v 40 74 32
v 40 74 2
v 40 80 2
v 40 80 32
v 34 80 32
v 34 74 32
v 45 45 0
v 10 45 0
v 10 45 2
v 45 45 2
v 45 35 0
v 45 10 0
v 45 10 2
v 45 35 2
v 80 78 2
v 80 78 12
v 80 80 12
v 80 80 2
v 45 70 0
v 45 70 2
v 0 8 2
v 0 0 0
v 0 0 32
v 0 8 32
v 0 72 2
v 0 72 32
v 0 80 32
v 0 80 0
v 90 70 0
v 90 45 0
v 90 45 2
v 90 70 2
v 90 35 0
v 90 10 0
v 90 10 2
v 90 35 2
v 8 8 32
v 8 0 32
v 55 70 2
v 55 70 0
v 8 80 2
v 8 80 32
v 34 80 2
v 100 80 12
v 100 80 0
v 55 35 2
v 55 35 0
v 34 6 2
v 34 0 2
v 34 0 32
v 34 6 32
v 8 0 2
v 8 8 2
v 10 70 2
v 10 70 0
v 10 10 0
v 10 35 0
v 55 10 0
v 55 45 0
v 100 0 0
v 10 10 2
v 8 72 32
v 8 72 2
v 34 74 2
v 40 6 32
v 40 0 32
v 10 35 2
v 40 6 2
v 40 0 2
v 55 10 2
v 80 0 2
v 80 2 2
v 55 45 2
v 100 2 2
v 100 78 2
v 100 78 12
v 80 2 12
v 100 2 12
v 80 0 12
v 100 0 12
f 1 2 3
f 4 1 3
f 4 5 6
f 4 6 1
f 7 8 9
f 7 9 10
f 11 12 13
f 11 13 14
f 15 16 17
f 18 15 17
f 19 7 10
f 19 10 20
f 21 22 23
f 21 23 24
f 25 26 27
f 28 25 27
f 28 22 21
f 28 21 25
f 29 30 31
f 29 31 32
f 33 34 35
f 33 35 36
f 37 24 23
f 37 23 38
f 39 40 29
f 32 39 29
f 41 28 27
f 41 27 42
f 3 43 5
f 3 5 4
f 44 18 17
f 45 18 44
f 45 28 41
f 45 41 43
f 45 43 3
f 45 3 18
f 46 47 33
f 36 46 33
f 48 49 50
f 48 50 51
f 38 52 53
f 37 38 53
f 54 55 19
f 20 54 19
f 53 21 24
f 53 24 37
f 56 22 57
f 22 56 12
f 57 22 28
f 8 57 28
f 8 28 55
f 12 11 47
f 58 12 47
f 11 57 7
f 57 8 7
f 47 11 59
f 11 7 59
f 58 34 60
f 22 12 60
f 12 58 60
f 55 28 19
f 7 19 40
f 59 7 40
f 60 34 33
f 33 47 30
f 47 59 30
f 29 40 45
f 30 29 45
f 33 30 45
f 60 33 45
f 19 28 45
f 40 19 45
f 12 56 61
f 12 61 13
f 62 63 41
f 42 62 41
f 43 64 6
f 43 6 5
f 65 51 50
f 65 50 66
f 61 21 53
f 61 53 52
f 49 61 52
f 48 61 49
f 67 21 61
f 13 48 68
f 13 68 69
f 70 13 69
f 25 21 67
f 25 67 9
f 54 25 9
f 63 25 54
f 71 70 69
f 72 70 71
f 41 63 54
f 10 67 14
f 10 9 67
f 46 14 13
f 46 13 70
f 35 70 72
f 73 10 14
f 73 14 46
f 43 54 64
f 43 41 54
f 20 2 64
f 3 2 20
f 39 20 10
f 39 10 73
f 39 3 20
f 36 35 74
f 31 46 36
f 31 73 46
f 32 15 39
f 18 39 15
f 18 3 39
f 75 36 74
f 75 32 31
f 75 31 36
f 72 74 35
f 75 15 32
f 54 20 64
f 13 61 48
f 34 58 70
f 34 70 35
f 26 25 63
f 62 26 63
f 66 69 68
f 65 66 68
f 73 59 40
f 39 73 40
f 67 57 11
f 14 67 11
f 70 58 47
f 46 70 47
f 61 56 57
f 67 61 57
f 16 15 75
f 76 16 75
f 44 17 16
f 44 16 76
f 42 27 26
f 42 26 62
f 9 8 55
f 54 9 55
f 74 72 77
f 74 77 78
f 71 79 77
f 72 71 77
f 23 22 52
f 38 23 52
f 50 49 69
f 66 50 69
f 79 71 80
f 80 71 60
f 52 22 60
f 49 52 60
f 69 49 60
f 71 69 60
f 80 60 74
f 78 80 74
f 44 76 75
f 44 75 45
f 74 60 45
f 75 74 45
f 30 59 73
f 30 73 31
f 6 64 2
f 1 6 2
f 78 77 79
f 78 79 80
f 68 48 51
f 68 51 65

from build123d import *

# Parameters (mm, degrees)
BOX009_W     = 10
BOX009_H     = 80
BOX009_DEPTH = 2
BOX008_W     = 20
BOX008_H     = 2
BOX008_DEPTH = 12
BOX007_W     = 20
BOX007_H     = 2
BOX007_DEPTH = 12
BOX006_W     = 80
BOX006_H     = 25
BOX006_DEPTH = 10
BOX005_W     = 80
BOX005_H     = 25
BOX005_DEPTH = 10
BOX004_W     = 6
BOX004_H     = 6
BOX004_DEPTH = 32
BOX003_W     = 6
BOX003_H     = 6
BOX003_DEPTH = 32
BOX002_W     = 8
BOX002_H     = 8
BOX002_DEPTH = 32
BOX001_W     = 8
BOX001_H     = 8
BOX001_DEPTH = 32
BOX_W        = 100
BOX_H        = 80
BOX_DEPTH    = 2


with BuildPart() as cube009:
    # Box009 → Box009 (new body)
    with BuildSketch(Plane(origin=(45, 0, 0), x_dir=(1, 0, 0), z_dir=(0, 0, 1))):
        with Locations((5, 40)):
            Rectangle(BOX009_W, BOX009_H)
    extrude(amount=BOX009_DEPTH)


with BuildPart() as cube008:
    # Box008 → Box008 (new body)
    with BuildSketch(Plane(origin=(80, 78, 0), x_dir=(1, 0, 0), z_dir=(0, 0, 1))):
        with Locations((10, 1)):
            Rectangle(BOX008_W, BOX008_H)
    extrude(amount=BOX008_DEPTH)


with BuildPart() as cube007:
    # Box007 → Box007 (new body)
    with BuildSketch(Plane(origin=(80, 0, 0), x_dir=(1, 0, 0), z_dir=(0, 0, 1))):
        with Locations((10, 1)):
            Rectangle(BOX007_W, BOX007_H)
    extrude(amount=BOX007_DEPTH)


with BuildPart() as cube006:
    # Box006 → Box006 (new body)
    with BuildSketch(Plane(origin=(10, 45, 0), x_dir=(1, 0, 0), z_dir=(0, 0, 1))):
        with Locations((40, 12.5)):
            Rectangle(BOX006_W, BOX006_H)
    extrude(amount=BOX006_DEPTH)


with BuildPart() as cube005:
    # Box005 → Box005 (new body)
    with BuildSketch(Plane(origin=(10, 10, 0), x_dir=(1, 0, 0), z_dir=(0, 0, 1))):
        with Locations((40, 12.5)):
            Rectangle(BOX005_W, BOX005_H)
    extrude(amount=BOX005_DEPTH)


with BuildPart() as cube004:
    # Box004 → Box004 (new body)
    with BuildSketch(Plane(origin=(34, 74, 0), x_dir=(1, 0, 0), z_dir=(0, 0, 1))):
        with Locations((3, 3)):
            Rectangle(BOX004_W, BOX004_H)
    extrude(amount=BOX004_DEPTH)


with BuildPart() as cube003:
    # Box003 → Box003 (new body)
    with BuildSketch(Plane(origin=(34, 0, 0), x_dir=(1, 0, 0), z_dir=(0, 0, 1))):
        with Locations((3, 3)):
            Rectangle(BOX003_W, BOX003_H)
    extrude(amount=BOX003_DEPTH)


with BuildPart() as cube002:
    # Box002 → Box002 (new body)
    with BuildSketch(Plane(origin=(0, 72, 0), x_dir=(1, 0, 0), z_dir=(0, 0, 1))):
        with Locations((4, 4)):
            Rectangle(BOX002_W, BOX002_H)
    extrude(amount=BOX002_DEPTH)


with BuildPart() as cube001:
    # Box001 → Box001 (new body)
    with BuildSketch(Plane.XY):
        with Locations((4, 4)):
            Rectangle(BOX001_W, BOX001_H)
    extrude(amount=BOX001_DEPTH)


with BuildPart() as fusion006:
    # Box → Box (new body)
    with BuildSketch(Plane.XY):
        with Locations((50, 40)):
            Rectangle(BOX_W, BOX_H)
    extrude(amount=BOX_DEPTH)

    # Fusion: union Cube001
    add(cube001.part)

    # Fusion001: union Cube002
    add(cube002.part)

    # Fusion002: union Cube003
    add(cube003.part)

    # Fusion003: union Cube004
    add(cube004.part)

    # Cut: cut Cube005
    add(cube005.part, mode=Mode.SUBTRACT)

    # Cut001: cut Cube006
    add(cube006.part, mode=Mode.SUBTRACT)

    # Fusion004: union Cube007
    add(cube007.part)

    # Fusion005: union Cube008
    add(cube008.part)

    # Fusion006: union Cube009
    add(cube009.part)


solid = fusion006.part
